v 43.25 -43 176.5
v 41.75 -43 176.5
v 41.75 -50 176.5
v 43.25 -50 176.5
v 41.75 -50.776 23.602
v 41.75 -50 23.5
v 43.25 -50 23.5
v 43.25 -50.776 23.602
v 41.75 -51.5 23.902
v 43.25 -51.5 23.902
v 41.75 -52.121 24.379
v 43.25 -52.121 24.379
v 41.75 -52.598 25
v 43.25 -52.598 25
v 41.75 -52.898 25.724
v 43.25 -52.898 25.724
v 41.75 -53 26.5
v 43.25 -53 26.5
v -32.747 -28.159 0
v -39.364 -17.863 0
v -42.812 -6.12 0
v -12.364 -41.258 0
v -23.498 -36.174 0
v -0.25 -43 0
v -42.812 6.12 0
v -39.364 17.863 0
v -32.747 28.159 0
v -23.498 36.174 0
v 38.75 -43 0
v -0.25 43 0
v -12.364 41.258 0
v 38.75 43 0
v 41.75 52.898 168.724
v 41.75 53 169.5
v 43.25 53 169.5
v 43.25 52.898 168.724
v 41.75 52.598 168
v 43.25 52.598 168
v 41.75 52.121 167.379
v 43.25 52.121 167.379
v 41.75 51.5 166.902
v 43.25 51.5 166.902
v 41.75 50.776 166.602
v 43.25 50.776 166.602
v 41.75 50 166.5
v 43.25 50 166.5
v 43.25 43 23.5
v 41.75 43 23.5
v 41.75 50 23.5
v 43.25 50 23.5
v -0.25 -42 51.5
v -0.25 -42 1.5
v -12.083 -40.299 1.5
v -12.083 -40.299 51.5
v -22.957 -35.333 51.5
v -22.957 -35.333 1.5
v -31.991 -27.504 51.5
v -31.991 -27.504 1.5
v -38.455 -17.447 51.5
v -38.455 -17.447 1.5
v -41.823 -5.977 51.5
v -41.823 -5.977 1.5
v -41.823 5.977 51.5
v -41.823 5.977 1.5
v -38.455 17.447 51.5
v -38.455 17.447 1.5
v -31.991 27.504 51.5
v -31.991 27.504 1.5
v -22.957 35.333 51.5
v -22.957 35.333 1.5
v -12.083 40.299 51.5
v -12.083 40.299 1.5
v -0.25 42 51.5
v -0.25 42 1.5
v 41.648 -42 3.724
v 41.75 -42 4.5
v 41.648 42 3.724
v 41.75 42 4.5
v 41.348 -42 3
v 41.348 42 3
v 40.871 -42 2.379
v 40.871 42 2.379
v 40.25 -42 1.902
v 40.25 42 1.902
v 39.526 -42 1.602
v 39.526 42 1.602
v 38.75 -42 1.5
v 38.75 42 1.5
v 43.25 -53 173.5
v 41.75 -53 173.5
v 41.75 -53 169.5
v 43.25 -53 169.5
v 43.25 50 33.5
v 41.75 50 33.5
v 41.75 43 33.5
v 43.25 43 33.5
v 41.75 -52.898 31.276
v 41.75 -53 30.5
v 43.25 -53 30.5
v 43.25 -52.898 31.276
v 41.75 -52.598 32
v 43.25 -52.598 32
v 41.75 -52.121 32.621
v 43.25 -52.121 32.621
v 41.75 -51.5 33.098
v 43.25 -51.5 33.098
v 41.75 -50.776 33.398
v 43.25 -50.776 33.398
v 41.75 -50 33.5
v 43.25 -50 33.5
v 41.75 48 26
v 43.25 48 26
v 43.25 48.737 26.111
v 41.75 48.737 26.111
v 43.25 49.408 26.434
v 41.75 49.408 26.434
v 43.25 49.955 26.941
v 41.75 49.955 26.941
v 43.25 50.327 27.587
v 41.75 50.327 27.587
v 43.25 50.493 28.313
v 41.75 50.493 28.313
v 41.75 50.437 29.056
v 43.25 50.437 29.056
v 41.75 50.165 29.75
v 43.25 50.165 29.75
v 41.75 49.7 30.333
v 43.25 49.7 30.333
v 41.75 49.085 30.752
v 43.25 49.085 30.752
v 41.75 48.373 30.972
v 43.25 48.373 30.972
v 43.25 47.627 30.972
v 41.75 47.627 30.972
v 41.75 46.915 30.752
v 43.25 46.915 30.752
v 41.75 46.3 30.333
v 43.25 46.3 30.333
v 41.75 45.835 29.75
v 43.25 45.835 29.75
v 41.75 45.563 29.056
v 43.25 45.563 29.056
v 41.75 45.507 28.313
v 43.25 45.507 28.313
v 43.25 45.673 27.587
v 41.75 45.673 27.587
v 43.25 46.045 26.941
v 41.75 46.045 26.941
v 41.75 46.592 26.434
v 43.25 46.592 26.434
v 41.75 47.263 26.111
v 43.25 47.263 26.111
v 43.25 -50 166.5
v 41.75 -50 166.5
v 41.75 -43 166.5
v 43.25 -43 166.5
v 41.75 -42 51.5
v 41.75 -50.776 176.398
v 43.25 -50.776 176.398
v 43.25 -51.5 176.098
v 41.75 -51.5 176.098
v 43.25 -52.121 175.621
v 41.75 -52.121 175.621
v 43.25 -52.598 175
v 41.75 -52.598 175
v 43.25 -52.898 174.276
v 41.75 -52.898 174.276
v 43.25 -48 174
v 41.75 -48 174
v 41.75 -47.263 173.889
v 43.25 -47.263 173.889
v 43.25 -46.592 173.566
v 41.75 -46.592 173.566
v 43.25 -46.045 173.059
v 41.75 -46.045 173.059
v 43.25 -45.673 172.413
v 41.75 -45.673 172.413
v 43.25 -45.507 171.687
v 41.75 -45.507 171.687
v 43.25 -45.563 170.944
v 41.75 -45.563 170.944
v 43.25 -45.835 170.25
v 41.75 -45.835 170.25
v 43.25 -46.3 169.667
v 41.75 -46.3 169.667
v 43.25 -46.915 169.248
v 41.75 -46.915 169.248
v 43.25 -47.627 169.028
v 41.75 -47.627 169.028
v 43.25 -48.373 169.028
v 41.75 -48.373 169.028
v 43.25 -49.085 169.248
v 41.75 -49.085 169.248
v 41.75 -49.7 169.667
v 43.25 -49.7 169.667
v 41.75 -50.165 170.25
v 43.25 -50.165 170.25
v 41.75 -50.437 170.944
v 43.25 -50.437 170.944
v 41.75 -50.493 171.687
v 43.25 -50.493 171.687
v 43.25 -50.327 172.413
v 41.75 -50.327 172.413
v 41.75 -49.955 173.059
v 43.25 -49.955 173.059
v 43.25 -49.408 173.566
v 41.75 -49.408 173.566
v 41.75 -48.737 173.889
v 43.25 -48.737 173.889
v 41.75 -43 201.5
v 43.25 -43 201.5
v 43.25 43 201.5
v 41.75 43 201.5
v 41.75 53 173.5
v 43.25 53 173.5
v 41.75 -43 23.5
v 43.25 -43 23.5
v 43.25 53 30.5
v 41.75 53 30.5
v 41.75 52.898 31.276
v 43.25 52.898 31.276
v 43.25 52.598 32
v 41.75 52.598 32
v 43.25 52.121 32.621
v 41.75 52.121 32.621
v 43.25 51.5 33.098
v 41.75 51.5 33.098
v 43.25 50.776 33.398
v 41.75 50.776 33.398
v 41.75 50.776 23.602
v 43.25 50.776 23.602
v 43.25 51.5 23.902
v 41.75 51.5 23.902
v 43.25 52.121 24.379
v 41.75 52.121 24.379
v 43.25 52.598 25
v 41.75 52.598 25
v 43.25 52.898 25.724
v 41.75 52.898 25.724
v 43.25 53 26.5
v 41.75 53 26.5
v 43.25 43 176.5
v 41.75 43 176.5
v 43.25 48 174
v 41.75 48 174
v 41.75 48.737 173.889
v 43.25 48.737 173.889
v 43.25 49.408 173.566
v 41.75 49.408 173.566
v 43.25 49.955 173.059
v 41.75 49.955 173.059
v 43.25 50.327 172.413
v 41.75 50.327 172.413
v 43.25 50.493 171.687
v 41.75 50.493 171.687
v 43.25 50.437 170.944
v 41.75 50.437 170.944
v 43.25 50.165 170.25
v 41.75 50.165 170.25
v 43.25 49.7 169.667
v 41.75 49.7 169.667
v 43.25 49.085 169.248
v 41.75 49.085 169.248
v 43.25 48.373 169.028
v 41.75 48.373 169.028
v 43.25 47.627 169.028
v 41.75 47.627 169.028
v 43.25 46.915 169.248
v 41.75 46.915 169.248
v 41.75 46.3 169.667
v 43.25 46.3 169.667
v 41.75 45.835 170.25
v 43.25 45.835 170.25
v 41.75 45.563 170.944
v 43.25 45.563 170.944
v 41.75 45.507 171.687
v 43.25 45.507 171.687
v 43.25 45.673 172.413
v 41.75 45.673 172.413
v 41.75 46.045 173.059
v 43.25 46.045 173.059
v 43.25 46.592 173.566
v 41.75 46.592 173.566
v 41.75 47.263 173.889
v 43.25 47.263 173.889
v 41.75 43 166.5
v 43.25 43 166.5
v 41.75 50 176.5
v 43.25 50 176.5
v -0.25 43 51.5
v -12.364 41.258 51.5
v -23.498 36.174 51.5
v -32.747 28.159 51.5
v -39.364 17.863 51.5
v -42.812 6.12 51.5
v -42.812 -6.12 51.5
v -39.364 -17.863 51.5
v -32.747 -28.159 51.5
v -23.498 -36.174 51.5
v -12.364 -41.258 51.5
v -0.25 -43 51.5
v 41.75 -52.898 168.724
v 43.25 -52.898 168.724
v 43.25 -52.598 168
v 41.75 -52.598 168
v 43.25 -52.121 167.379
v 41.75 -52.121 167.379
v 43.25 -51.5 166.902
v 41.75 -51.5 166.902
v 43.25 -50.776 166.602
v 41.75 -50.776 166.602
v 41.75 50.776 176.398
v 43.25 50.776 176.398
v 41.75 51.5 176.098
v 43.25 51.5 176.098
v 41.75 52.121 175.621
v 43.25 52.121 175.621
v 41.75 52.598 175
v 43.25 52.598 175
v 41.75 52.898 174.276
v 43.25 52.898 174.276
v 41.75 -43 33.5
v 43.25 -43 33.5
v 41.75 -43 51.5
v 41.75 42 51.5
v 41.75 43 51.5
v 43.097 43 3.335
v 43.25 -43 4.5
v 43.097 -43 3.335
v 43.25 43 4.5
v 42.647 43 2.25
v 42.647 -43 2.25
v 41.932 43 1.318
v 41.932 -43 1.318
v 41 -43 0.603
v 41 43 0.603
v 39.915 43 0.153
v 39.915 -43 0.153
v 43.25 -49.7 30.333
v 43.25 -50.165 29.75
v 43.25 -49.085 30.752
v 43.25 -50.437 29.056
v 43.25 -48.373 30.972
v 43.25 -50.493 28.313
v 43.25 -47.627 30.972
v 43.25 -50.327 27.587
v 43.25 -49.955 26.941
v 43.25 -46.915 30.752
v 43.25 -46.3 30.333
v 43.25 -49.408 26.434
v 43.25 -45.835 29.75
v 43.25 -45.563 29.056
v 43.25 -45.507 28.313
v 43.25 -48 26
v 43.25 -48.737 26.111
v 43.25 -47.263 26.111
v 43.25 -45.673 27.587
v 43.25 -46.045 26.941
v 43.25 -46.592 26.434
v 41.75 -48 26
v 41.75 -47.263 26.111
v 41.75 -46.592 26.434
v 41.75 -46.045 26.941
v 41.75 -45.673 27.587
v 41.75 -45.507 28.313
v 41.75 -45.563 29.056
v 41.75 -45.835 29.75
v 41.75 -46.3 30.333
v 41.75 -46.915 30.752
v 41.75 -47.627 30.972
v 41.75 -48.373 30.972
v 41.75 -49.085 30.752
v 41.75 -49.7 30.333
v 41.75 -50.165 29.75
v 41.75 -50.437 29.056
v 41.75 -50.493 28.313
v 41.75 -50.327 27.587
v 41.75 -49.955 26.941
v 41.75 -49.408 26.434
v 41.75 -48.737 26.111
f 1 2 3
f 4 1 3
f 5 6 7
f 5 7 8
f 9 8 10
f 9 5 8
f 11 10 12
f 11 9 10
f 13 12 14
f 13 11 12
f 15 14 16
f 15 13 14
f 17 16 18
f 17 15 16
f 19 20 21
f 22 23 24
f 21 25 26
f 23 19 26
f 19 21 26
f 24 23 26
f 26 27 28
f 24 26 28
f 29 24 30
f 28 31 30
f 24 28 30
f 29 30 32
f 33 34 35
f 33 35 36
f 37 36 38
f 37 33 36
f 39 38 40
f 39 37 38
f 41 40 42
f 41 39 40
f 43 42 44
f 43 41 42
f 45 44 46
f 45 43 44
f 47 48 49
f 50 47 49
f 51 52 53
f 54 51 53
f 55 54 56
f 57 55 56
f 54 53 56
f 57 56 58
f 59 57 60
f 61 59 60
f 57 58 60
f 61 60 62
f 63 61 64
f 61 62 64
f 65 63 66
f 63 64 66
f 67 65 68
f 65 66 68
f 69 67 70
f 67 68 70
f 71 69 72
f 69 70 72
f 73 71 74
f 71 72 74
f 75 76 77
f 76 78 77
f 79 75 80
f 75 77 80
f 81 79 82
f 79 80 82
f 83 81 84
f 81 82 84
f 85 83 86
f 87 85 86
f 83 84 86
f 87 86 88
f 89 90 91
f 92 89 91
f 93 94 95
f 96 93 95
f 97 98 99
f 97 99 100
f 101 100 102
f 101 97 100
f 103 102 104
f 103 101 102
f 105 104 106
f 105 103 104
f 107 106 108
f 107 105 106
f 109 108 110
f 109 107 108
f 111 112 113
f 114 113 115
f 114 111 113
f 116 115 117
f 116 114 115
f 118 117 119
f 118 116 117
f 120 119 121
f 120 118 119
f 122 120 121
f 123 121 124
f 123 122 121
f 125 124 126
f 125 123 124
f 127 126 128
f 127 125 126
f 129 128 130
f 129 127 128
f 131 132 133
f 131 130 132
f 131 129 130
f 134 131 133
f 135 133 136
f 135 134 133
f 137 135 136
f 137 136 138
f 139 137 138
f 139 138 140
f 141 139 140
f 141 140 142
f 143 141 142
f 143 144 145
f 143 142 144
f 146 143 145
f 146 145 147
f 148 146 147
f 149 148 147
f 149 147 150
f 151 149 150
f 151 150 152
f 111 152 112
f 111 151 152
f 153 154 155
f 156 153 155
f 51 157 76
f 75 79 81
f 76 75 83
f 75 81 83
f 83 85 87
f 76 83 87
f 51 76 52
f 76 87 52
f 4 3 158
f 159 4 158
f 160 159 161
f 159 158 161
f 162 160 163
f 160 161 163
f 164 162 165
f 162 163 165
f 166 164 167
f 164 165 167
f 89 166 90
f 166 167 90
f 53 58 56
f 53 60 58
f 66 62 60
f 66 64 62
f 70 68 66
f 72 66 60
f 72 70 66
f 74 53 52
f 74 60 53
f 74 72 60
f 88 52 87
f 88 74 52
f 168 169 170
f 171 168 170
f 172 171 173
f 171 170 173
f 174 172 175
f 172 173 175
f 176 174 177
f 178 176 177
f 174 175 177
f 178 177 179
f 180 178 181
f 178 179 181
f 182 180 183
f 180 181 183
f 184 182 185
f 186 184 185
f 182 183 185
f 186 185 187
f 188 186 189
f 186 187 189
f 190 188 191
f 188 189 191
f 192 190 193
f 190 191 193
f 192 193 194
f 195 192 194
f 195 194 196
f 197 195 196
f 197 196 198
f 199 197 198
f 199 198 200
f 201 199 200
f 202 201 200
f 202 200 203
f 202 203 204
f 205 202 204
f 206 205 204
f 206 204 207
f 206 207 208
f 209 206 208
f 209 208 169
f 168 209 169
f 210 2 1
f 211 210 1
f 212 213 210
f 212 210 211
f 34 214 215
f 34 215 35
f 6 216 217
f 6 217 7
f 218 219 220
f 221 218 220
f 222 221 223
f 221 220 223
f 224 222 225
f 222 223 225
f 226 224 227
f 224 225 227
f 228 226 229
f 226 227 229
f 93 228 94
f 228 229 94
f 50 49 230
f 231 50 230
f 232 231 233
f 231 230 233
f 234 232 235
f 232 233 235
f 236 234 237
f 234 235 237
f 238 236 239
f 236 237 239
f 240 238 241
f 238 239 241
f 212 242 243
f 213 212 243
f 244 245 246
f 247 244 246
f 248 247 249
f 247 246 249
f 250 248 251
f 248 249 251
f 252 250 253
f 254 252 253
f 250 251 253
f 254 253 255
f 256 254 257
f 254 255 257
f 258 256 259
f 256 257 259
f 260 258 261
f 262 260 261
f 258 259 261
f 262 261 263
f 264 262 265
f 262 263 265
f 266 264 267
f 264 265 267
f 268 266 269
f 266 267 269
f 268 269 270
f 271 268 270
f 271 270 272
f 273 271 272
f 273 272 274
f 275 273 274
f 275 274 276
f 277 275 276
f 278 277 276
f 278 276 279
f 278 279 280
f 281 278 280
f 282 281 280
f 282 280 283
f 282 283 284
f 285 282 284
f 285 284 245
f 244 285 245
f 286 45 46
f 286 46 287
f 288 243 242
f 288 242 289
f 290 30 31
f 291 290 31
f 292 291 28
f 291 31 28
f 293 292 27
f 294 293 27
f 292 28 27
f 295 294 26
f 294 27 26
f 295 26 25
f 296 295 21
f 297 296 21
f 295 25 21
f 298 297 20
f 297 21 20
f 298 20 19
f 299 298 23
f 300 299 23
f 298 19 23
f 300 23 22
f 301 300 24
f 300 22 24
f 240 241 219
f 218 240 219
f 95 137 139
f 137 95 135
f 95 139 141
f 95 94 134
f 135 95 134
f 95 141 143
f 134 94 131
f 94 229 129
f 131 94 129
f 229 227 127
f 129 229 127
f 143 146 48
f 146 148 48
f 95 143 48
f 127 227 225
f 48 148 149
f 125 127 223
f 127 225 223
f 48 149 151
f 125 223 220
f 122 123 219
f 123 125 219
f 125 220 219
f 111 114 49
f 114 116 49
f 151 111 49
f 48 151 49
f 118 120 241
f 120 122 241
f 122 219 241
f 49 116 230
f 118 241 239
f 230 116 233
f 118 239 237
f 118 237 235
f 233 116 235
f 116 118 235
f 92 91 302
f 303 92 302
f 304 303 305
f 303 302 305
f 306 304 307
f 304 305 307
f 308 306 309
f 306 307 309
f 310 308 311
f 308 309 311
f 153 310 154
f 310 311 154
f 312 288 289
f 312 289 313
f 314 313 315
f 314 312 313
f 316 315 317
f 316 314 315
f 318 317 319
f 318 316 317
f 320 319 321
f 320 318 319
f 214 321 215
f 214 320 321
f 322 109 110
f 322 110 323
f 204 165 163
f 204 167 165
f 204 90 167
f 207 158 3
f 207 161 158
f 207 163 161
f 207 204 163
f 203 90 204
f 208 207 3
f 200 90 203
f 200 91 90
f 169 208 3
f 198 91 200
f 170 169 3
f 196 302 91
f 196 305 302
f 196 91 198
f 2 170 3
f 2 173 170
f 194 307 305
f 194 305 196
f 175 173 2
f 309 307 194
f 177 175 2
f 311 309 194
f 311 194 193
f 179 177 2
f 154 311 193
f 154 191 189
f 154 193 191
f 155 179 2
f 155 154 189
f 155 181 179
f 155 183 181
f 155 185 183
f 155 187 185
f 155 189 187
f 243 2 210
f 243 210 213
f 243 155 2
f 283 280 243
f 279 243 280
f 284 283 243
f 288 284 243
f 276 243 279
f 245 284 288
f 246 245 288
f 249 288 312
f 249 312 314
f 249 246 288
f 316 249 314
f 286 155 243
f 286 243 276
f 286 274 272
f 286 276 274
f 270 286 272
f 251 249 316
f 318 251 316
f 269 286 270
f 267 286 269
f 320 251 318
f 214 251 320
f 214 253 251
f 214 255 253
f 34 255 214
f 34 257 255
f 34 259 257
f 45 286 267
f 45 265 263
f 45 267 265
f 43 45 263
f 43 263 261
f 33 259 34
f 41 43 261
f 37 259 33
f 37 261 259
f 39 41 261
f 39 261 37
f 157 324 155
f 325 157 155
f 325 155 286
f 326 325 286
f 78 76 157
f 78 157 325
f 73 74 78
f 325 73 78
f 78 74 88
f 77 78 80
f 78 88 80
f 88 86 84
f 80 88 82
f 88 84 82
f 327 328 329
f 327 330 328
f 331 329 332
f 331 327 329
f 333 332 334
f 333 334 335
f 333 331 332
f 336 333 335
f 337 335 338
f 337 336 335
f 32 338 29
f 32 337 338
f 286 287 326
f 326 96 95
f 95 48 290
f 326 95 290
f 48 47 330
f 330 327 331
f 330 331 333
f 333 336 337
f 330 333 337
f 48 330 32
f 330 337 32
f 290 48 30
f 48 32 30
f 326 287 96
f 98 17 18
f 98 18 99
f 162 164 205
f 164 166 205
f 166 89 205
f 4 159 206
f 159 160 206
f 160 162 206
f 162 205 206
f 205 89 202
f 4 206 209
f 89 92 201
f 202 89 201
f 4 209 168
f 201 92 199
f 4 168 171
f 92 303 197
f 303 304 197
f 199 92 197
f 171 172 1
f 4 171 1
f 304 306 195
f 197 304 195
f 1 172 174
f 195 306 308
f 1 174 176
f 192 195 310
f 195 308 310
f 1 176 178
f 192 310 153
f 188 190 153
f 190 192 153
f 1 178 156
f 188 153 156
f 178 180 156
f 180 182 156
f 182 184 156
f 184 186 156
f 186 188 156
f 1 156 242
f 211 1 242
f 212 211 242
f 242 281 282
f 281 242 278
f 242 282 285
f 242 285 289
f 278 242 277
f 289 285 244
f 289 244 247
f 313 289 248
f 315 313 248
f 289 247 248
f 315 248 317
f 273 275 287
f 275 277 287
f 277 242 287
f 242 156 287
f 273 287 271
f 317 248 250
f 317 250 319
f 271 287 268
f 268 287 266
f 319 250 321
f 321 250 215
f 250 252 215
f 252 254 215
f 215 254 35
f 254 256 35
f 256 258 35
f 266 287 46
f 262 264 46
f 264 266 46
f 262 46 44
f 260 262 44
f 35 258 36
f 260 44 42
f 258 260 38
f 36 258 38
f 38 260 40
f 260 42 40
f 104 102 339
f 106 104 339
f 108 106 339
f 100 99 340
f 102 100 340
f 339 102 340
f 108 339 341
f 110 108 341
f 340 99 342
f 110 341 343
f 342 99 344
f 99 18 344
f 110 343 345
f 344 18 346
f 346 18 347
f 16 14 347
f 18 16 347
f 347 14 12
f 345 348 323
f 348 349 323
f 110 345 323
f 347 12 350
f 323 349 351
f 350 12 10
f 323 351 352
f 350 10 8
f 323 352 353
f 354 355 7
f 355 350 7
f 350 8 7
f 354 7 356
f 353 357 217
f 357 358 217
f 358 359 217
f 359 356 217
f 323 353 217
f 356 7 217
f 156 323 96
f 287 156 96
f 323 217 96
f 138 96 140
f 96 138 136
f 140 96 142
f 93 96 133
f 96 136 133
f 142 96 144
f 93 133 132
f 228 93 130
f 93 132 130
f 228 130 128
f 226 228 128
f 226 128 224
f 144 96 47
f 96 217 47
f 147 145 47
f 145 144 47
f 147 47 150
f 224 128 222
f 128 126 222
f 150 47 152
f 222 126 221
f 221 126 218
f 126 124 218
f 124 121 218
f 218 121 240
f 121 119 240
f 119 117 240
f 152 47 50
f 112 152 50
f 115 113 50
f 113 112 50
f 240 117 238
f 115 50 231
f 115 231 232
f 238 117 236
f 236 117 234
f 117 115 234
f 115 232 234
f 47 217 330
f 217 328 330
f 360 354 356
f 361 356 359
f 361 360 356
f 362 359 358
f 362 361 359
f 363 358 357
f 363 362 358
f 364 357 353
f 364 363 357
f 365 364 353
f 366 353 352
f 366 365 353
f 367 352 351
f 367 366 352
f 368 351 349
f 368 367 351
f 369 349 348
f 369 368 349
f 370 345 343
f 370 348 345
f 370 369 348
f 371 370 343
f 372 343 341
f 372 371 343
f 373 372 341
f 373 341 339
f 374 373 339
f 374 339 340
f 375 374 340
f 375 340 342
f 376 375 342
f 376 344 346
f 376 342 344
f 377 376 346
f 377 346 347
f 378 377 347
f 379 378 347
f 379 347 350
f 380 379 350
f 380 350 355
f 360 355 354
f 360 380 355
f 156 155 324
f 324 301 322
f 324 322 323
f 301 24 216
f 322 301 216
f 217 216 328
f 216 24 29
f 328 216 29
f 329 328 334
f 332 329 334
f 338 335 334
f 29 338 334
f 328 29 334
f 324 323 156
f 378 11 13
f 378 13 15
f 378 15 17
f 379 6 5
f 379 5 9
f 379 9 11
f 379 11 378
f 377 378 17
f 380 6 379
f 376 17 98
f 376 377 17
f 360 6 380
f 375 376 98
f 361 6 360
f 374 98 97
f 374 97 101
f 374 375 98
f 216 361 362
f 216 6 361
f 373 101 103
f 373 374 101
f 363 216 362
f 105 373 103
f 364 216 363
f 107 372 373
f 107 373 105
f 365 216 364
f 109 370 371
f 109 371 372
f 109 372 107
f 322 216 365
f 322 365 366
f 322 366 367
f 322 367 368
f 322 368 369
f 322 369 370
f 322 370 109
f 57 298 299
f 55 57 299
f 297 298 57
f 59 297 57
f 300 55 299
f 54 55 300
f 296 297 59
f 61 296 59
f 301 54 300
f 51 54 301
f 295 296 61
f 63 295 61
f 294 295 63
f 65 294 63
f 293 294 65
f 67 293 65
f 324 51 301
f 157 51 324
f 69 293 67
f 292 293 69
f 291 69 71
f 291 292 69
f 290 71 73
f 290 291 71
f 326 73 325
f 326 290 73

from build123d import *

# Parameters (mm, degrees)
DODANIE_WYCI_GNI_CIE1_DEPTH = 1.5
SZKIC2_W                    = 1.5
SZKIC2_H                    = 86
DODANIE_WYCI_GNI_CIE2_DEPTH = 200
DODANIE_WYCI_GNI_CIE3_DEPTH = 50
ZAOKR_GLENIE1_R             = 3
ZAOKR_GLENIE2_R             = 4.5
DODANIE_WYCI_GNI_CIE4_DEPTH = 1.5
SZKIC6_R                    = 2.5
WYTNIJ_WYCI_GNI_CIE1_DEPTH  = 2.5


with BuildPart() as part:
    # Szkic1 → Dodanie-wyciągnięcie1 (new body)
    with BuildSketch(Plane.XY):
        with BuildLine():
            Line((-0.25, -43), (43.25, -43))
            Line((43.25, -43), (43.25, 43))
            Line((43.25, 43), (-0.25, 43))
            ThreePointArc((-0.25, 43), (-43.25, 0), (-0.25, -43))
        make_face()
    extrude(amount=DODANIE_WYCI_GNI_CIE1_DEPTH)

    # Szkic2 → Dodanie-wyciągnięcie2 (add)
    with BuildSketch(Plane.XY.offset(1.5)):
        with Locations((42.5, 0)):
            Rectangle(SZKIC2_W, SZKIC2_H)
    extrude(amount=DODANIE_WYCI_GNI_CIE2_DEPTH)

    # Szkic4 → Dodanie-wyciągnięcie3 (add)
    with BuildSketch(Plane.XY.offset(1.5)):
        with BuildLine():
            Line((-0.25, -43), (41.75, -43))
            Line((41.75, -43), (41.75, -42))
            Line((41.75, -42), (-0.25, -42))
            ThreePointArc((-0.25, -42), (-42.25, 0), (-0.25, 42))
            Line((-0.25, 42), (41.75, 42))
            Line((41.75, 42), (41.75, 43))
            Line((41.75, 43), (-0.25, 43))
            ThreePointArc((-0.25, 43), (-43.25, 0), (-0.25, -43))
        make_face()
    extrude(amount=DODANIE_WYCI_GNI_CIE3_DEPTH)

    # Zaokrąglenie1
    zaokr_glenie1_edges = [part.edges().sort_by_distance(p)[0] for p in [
        (41.75, 0, 1.5),
    ]]
    fillet(zaokr_glenie1_edges, radius=ZAOKR_GLENIE1_R)

    # Zaokrąglenie2
    zaokr_glenie2_edges = [part.edges().sort_by_distance(p)[0] for p in [
        (43.25, 0, 0),
    ]]
    fillet(zaokr_glenie2_edges, radius=ZAOKR_GLENIE2_R)

    # Szkic5 → Dodanie-wyciągnięcie4 (add)
    with BuildSketch(Plane.ZY.offset(-41.75)):
        with BuildLine():
            Line((166.5, 43), (176.5, 43))
            Line((176.5, 43), (176.5, 50))
            ThreePointArc((176.5, 50), (175.621320344, 52.121320344), (173.5, 53))
            Line((173.5, 53), (169.5, 53))
            ThreePointArc((169.5, 53), (167.378679656, 52.121320344), (166.5, 50))
            Line((166.5, 50), (166.5, 43))
        make_face()
        with BuildLine():
            Line((166.5, -50), (166.5, -43))
            Line((166.5, -43), (176.5, -43))
            Line((176.5, -43), (176.5, -50))
            ThreePointArc((176.5, -50), (175.621320344, -52.121320344), (173.5, -53))
            Line((173.5, -53), (169.5, -53))
            ThreePointArc((169.5, -53), (167.378679656, -52.121320344), (166.5, -50))
        make_face()
    dodanie_wyci_gni_cie4 = extrude(amount=-DODANIE_WYCI_GNI_CIE4_DEPTH)

    # Szkic6 → Wytnij-wyciągnięcie1 (cut, through all)
    with BuildSketch(Plane.ZY.offset(-41.75)):
        with Locations((171.5, 48)):
            Circle(SZKIC6_R)
        with Locations((171.5, -48)):
            Circle(SZKIC6_R)
    wytnij_wyci_gni_cie1 = extrude(amount=-WYTNIJ_WYCI_GNI_CIE1_DEPTH, mode=Mode.SUBTRACT)

    # Lustro1: Dodanie-wyciągnięcie4, Wytnij-wyciągnięcie1 across plane
    add(dodanie_wyci_gni_cie4.mirror(Plane.XY.offset(100)))
    add(wytnij_wyci_gni_cie1.mirror(Plane.XY.offset(100)), mode=Mode.SUBTRACT)


solid = part.part
